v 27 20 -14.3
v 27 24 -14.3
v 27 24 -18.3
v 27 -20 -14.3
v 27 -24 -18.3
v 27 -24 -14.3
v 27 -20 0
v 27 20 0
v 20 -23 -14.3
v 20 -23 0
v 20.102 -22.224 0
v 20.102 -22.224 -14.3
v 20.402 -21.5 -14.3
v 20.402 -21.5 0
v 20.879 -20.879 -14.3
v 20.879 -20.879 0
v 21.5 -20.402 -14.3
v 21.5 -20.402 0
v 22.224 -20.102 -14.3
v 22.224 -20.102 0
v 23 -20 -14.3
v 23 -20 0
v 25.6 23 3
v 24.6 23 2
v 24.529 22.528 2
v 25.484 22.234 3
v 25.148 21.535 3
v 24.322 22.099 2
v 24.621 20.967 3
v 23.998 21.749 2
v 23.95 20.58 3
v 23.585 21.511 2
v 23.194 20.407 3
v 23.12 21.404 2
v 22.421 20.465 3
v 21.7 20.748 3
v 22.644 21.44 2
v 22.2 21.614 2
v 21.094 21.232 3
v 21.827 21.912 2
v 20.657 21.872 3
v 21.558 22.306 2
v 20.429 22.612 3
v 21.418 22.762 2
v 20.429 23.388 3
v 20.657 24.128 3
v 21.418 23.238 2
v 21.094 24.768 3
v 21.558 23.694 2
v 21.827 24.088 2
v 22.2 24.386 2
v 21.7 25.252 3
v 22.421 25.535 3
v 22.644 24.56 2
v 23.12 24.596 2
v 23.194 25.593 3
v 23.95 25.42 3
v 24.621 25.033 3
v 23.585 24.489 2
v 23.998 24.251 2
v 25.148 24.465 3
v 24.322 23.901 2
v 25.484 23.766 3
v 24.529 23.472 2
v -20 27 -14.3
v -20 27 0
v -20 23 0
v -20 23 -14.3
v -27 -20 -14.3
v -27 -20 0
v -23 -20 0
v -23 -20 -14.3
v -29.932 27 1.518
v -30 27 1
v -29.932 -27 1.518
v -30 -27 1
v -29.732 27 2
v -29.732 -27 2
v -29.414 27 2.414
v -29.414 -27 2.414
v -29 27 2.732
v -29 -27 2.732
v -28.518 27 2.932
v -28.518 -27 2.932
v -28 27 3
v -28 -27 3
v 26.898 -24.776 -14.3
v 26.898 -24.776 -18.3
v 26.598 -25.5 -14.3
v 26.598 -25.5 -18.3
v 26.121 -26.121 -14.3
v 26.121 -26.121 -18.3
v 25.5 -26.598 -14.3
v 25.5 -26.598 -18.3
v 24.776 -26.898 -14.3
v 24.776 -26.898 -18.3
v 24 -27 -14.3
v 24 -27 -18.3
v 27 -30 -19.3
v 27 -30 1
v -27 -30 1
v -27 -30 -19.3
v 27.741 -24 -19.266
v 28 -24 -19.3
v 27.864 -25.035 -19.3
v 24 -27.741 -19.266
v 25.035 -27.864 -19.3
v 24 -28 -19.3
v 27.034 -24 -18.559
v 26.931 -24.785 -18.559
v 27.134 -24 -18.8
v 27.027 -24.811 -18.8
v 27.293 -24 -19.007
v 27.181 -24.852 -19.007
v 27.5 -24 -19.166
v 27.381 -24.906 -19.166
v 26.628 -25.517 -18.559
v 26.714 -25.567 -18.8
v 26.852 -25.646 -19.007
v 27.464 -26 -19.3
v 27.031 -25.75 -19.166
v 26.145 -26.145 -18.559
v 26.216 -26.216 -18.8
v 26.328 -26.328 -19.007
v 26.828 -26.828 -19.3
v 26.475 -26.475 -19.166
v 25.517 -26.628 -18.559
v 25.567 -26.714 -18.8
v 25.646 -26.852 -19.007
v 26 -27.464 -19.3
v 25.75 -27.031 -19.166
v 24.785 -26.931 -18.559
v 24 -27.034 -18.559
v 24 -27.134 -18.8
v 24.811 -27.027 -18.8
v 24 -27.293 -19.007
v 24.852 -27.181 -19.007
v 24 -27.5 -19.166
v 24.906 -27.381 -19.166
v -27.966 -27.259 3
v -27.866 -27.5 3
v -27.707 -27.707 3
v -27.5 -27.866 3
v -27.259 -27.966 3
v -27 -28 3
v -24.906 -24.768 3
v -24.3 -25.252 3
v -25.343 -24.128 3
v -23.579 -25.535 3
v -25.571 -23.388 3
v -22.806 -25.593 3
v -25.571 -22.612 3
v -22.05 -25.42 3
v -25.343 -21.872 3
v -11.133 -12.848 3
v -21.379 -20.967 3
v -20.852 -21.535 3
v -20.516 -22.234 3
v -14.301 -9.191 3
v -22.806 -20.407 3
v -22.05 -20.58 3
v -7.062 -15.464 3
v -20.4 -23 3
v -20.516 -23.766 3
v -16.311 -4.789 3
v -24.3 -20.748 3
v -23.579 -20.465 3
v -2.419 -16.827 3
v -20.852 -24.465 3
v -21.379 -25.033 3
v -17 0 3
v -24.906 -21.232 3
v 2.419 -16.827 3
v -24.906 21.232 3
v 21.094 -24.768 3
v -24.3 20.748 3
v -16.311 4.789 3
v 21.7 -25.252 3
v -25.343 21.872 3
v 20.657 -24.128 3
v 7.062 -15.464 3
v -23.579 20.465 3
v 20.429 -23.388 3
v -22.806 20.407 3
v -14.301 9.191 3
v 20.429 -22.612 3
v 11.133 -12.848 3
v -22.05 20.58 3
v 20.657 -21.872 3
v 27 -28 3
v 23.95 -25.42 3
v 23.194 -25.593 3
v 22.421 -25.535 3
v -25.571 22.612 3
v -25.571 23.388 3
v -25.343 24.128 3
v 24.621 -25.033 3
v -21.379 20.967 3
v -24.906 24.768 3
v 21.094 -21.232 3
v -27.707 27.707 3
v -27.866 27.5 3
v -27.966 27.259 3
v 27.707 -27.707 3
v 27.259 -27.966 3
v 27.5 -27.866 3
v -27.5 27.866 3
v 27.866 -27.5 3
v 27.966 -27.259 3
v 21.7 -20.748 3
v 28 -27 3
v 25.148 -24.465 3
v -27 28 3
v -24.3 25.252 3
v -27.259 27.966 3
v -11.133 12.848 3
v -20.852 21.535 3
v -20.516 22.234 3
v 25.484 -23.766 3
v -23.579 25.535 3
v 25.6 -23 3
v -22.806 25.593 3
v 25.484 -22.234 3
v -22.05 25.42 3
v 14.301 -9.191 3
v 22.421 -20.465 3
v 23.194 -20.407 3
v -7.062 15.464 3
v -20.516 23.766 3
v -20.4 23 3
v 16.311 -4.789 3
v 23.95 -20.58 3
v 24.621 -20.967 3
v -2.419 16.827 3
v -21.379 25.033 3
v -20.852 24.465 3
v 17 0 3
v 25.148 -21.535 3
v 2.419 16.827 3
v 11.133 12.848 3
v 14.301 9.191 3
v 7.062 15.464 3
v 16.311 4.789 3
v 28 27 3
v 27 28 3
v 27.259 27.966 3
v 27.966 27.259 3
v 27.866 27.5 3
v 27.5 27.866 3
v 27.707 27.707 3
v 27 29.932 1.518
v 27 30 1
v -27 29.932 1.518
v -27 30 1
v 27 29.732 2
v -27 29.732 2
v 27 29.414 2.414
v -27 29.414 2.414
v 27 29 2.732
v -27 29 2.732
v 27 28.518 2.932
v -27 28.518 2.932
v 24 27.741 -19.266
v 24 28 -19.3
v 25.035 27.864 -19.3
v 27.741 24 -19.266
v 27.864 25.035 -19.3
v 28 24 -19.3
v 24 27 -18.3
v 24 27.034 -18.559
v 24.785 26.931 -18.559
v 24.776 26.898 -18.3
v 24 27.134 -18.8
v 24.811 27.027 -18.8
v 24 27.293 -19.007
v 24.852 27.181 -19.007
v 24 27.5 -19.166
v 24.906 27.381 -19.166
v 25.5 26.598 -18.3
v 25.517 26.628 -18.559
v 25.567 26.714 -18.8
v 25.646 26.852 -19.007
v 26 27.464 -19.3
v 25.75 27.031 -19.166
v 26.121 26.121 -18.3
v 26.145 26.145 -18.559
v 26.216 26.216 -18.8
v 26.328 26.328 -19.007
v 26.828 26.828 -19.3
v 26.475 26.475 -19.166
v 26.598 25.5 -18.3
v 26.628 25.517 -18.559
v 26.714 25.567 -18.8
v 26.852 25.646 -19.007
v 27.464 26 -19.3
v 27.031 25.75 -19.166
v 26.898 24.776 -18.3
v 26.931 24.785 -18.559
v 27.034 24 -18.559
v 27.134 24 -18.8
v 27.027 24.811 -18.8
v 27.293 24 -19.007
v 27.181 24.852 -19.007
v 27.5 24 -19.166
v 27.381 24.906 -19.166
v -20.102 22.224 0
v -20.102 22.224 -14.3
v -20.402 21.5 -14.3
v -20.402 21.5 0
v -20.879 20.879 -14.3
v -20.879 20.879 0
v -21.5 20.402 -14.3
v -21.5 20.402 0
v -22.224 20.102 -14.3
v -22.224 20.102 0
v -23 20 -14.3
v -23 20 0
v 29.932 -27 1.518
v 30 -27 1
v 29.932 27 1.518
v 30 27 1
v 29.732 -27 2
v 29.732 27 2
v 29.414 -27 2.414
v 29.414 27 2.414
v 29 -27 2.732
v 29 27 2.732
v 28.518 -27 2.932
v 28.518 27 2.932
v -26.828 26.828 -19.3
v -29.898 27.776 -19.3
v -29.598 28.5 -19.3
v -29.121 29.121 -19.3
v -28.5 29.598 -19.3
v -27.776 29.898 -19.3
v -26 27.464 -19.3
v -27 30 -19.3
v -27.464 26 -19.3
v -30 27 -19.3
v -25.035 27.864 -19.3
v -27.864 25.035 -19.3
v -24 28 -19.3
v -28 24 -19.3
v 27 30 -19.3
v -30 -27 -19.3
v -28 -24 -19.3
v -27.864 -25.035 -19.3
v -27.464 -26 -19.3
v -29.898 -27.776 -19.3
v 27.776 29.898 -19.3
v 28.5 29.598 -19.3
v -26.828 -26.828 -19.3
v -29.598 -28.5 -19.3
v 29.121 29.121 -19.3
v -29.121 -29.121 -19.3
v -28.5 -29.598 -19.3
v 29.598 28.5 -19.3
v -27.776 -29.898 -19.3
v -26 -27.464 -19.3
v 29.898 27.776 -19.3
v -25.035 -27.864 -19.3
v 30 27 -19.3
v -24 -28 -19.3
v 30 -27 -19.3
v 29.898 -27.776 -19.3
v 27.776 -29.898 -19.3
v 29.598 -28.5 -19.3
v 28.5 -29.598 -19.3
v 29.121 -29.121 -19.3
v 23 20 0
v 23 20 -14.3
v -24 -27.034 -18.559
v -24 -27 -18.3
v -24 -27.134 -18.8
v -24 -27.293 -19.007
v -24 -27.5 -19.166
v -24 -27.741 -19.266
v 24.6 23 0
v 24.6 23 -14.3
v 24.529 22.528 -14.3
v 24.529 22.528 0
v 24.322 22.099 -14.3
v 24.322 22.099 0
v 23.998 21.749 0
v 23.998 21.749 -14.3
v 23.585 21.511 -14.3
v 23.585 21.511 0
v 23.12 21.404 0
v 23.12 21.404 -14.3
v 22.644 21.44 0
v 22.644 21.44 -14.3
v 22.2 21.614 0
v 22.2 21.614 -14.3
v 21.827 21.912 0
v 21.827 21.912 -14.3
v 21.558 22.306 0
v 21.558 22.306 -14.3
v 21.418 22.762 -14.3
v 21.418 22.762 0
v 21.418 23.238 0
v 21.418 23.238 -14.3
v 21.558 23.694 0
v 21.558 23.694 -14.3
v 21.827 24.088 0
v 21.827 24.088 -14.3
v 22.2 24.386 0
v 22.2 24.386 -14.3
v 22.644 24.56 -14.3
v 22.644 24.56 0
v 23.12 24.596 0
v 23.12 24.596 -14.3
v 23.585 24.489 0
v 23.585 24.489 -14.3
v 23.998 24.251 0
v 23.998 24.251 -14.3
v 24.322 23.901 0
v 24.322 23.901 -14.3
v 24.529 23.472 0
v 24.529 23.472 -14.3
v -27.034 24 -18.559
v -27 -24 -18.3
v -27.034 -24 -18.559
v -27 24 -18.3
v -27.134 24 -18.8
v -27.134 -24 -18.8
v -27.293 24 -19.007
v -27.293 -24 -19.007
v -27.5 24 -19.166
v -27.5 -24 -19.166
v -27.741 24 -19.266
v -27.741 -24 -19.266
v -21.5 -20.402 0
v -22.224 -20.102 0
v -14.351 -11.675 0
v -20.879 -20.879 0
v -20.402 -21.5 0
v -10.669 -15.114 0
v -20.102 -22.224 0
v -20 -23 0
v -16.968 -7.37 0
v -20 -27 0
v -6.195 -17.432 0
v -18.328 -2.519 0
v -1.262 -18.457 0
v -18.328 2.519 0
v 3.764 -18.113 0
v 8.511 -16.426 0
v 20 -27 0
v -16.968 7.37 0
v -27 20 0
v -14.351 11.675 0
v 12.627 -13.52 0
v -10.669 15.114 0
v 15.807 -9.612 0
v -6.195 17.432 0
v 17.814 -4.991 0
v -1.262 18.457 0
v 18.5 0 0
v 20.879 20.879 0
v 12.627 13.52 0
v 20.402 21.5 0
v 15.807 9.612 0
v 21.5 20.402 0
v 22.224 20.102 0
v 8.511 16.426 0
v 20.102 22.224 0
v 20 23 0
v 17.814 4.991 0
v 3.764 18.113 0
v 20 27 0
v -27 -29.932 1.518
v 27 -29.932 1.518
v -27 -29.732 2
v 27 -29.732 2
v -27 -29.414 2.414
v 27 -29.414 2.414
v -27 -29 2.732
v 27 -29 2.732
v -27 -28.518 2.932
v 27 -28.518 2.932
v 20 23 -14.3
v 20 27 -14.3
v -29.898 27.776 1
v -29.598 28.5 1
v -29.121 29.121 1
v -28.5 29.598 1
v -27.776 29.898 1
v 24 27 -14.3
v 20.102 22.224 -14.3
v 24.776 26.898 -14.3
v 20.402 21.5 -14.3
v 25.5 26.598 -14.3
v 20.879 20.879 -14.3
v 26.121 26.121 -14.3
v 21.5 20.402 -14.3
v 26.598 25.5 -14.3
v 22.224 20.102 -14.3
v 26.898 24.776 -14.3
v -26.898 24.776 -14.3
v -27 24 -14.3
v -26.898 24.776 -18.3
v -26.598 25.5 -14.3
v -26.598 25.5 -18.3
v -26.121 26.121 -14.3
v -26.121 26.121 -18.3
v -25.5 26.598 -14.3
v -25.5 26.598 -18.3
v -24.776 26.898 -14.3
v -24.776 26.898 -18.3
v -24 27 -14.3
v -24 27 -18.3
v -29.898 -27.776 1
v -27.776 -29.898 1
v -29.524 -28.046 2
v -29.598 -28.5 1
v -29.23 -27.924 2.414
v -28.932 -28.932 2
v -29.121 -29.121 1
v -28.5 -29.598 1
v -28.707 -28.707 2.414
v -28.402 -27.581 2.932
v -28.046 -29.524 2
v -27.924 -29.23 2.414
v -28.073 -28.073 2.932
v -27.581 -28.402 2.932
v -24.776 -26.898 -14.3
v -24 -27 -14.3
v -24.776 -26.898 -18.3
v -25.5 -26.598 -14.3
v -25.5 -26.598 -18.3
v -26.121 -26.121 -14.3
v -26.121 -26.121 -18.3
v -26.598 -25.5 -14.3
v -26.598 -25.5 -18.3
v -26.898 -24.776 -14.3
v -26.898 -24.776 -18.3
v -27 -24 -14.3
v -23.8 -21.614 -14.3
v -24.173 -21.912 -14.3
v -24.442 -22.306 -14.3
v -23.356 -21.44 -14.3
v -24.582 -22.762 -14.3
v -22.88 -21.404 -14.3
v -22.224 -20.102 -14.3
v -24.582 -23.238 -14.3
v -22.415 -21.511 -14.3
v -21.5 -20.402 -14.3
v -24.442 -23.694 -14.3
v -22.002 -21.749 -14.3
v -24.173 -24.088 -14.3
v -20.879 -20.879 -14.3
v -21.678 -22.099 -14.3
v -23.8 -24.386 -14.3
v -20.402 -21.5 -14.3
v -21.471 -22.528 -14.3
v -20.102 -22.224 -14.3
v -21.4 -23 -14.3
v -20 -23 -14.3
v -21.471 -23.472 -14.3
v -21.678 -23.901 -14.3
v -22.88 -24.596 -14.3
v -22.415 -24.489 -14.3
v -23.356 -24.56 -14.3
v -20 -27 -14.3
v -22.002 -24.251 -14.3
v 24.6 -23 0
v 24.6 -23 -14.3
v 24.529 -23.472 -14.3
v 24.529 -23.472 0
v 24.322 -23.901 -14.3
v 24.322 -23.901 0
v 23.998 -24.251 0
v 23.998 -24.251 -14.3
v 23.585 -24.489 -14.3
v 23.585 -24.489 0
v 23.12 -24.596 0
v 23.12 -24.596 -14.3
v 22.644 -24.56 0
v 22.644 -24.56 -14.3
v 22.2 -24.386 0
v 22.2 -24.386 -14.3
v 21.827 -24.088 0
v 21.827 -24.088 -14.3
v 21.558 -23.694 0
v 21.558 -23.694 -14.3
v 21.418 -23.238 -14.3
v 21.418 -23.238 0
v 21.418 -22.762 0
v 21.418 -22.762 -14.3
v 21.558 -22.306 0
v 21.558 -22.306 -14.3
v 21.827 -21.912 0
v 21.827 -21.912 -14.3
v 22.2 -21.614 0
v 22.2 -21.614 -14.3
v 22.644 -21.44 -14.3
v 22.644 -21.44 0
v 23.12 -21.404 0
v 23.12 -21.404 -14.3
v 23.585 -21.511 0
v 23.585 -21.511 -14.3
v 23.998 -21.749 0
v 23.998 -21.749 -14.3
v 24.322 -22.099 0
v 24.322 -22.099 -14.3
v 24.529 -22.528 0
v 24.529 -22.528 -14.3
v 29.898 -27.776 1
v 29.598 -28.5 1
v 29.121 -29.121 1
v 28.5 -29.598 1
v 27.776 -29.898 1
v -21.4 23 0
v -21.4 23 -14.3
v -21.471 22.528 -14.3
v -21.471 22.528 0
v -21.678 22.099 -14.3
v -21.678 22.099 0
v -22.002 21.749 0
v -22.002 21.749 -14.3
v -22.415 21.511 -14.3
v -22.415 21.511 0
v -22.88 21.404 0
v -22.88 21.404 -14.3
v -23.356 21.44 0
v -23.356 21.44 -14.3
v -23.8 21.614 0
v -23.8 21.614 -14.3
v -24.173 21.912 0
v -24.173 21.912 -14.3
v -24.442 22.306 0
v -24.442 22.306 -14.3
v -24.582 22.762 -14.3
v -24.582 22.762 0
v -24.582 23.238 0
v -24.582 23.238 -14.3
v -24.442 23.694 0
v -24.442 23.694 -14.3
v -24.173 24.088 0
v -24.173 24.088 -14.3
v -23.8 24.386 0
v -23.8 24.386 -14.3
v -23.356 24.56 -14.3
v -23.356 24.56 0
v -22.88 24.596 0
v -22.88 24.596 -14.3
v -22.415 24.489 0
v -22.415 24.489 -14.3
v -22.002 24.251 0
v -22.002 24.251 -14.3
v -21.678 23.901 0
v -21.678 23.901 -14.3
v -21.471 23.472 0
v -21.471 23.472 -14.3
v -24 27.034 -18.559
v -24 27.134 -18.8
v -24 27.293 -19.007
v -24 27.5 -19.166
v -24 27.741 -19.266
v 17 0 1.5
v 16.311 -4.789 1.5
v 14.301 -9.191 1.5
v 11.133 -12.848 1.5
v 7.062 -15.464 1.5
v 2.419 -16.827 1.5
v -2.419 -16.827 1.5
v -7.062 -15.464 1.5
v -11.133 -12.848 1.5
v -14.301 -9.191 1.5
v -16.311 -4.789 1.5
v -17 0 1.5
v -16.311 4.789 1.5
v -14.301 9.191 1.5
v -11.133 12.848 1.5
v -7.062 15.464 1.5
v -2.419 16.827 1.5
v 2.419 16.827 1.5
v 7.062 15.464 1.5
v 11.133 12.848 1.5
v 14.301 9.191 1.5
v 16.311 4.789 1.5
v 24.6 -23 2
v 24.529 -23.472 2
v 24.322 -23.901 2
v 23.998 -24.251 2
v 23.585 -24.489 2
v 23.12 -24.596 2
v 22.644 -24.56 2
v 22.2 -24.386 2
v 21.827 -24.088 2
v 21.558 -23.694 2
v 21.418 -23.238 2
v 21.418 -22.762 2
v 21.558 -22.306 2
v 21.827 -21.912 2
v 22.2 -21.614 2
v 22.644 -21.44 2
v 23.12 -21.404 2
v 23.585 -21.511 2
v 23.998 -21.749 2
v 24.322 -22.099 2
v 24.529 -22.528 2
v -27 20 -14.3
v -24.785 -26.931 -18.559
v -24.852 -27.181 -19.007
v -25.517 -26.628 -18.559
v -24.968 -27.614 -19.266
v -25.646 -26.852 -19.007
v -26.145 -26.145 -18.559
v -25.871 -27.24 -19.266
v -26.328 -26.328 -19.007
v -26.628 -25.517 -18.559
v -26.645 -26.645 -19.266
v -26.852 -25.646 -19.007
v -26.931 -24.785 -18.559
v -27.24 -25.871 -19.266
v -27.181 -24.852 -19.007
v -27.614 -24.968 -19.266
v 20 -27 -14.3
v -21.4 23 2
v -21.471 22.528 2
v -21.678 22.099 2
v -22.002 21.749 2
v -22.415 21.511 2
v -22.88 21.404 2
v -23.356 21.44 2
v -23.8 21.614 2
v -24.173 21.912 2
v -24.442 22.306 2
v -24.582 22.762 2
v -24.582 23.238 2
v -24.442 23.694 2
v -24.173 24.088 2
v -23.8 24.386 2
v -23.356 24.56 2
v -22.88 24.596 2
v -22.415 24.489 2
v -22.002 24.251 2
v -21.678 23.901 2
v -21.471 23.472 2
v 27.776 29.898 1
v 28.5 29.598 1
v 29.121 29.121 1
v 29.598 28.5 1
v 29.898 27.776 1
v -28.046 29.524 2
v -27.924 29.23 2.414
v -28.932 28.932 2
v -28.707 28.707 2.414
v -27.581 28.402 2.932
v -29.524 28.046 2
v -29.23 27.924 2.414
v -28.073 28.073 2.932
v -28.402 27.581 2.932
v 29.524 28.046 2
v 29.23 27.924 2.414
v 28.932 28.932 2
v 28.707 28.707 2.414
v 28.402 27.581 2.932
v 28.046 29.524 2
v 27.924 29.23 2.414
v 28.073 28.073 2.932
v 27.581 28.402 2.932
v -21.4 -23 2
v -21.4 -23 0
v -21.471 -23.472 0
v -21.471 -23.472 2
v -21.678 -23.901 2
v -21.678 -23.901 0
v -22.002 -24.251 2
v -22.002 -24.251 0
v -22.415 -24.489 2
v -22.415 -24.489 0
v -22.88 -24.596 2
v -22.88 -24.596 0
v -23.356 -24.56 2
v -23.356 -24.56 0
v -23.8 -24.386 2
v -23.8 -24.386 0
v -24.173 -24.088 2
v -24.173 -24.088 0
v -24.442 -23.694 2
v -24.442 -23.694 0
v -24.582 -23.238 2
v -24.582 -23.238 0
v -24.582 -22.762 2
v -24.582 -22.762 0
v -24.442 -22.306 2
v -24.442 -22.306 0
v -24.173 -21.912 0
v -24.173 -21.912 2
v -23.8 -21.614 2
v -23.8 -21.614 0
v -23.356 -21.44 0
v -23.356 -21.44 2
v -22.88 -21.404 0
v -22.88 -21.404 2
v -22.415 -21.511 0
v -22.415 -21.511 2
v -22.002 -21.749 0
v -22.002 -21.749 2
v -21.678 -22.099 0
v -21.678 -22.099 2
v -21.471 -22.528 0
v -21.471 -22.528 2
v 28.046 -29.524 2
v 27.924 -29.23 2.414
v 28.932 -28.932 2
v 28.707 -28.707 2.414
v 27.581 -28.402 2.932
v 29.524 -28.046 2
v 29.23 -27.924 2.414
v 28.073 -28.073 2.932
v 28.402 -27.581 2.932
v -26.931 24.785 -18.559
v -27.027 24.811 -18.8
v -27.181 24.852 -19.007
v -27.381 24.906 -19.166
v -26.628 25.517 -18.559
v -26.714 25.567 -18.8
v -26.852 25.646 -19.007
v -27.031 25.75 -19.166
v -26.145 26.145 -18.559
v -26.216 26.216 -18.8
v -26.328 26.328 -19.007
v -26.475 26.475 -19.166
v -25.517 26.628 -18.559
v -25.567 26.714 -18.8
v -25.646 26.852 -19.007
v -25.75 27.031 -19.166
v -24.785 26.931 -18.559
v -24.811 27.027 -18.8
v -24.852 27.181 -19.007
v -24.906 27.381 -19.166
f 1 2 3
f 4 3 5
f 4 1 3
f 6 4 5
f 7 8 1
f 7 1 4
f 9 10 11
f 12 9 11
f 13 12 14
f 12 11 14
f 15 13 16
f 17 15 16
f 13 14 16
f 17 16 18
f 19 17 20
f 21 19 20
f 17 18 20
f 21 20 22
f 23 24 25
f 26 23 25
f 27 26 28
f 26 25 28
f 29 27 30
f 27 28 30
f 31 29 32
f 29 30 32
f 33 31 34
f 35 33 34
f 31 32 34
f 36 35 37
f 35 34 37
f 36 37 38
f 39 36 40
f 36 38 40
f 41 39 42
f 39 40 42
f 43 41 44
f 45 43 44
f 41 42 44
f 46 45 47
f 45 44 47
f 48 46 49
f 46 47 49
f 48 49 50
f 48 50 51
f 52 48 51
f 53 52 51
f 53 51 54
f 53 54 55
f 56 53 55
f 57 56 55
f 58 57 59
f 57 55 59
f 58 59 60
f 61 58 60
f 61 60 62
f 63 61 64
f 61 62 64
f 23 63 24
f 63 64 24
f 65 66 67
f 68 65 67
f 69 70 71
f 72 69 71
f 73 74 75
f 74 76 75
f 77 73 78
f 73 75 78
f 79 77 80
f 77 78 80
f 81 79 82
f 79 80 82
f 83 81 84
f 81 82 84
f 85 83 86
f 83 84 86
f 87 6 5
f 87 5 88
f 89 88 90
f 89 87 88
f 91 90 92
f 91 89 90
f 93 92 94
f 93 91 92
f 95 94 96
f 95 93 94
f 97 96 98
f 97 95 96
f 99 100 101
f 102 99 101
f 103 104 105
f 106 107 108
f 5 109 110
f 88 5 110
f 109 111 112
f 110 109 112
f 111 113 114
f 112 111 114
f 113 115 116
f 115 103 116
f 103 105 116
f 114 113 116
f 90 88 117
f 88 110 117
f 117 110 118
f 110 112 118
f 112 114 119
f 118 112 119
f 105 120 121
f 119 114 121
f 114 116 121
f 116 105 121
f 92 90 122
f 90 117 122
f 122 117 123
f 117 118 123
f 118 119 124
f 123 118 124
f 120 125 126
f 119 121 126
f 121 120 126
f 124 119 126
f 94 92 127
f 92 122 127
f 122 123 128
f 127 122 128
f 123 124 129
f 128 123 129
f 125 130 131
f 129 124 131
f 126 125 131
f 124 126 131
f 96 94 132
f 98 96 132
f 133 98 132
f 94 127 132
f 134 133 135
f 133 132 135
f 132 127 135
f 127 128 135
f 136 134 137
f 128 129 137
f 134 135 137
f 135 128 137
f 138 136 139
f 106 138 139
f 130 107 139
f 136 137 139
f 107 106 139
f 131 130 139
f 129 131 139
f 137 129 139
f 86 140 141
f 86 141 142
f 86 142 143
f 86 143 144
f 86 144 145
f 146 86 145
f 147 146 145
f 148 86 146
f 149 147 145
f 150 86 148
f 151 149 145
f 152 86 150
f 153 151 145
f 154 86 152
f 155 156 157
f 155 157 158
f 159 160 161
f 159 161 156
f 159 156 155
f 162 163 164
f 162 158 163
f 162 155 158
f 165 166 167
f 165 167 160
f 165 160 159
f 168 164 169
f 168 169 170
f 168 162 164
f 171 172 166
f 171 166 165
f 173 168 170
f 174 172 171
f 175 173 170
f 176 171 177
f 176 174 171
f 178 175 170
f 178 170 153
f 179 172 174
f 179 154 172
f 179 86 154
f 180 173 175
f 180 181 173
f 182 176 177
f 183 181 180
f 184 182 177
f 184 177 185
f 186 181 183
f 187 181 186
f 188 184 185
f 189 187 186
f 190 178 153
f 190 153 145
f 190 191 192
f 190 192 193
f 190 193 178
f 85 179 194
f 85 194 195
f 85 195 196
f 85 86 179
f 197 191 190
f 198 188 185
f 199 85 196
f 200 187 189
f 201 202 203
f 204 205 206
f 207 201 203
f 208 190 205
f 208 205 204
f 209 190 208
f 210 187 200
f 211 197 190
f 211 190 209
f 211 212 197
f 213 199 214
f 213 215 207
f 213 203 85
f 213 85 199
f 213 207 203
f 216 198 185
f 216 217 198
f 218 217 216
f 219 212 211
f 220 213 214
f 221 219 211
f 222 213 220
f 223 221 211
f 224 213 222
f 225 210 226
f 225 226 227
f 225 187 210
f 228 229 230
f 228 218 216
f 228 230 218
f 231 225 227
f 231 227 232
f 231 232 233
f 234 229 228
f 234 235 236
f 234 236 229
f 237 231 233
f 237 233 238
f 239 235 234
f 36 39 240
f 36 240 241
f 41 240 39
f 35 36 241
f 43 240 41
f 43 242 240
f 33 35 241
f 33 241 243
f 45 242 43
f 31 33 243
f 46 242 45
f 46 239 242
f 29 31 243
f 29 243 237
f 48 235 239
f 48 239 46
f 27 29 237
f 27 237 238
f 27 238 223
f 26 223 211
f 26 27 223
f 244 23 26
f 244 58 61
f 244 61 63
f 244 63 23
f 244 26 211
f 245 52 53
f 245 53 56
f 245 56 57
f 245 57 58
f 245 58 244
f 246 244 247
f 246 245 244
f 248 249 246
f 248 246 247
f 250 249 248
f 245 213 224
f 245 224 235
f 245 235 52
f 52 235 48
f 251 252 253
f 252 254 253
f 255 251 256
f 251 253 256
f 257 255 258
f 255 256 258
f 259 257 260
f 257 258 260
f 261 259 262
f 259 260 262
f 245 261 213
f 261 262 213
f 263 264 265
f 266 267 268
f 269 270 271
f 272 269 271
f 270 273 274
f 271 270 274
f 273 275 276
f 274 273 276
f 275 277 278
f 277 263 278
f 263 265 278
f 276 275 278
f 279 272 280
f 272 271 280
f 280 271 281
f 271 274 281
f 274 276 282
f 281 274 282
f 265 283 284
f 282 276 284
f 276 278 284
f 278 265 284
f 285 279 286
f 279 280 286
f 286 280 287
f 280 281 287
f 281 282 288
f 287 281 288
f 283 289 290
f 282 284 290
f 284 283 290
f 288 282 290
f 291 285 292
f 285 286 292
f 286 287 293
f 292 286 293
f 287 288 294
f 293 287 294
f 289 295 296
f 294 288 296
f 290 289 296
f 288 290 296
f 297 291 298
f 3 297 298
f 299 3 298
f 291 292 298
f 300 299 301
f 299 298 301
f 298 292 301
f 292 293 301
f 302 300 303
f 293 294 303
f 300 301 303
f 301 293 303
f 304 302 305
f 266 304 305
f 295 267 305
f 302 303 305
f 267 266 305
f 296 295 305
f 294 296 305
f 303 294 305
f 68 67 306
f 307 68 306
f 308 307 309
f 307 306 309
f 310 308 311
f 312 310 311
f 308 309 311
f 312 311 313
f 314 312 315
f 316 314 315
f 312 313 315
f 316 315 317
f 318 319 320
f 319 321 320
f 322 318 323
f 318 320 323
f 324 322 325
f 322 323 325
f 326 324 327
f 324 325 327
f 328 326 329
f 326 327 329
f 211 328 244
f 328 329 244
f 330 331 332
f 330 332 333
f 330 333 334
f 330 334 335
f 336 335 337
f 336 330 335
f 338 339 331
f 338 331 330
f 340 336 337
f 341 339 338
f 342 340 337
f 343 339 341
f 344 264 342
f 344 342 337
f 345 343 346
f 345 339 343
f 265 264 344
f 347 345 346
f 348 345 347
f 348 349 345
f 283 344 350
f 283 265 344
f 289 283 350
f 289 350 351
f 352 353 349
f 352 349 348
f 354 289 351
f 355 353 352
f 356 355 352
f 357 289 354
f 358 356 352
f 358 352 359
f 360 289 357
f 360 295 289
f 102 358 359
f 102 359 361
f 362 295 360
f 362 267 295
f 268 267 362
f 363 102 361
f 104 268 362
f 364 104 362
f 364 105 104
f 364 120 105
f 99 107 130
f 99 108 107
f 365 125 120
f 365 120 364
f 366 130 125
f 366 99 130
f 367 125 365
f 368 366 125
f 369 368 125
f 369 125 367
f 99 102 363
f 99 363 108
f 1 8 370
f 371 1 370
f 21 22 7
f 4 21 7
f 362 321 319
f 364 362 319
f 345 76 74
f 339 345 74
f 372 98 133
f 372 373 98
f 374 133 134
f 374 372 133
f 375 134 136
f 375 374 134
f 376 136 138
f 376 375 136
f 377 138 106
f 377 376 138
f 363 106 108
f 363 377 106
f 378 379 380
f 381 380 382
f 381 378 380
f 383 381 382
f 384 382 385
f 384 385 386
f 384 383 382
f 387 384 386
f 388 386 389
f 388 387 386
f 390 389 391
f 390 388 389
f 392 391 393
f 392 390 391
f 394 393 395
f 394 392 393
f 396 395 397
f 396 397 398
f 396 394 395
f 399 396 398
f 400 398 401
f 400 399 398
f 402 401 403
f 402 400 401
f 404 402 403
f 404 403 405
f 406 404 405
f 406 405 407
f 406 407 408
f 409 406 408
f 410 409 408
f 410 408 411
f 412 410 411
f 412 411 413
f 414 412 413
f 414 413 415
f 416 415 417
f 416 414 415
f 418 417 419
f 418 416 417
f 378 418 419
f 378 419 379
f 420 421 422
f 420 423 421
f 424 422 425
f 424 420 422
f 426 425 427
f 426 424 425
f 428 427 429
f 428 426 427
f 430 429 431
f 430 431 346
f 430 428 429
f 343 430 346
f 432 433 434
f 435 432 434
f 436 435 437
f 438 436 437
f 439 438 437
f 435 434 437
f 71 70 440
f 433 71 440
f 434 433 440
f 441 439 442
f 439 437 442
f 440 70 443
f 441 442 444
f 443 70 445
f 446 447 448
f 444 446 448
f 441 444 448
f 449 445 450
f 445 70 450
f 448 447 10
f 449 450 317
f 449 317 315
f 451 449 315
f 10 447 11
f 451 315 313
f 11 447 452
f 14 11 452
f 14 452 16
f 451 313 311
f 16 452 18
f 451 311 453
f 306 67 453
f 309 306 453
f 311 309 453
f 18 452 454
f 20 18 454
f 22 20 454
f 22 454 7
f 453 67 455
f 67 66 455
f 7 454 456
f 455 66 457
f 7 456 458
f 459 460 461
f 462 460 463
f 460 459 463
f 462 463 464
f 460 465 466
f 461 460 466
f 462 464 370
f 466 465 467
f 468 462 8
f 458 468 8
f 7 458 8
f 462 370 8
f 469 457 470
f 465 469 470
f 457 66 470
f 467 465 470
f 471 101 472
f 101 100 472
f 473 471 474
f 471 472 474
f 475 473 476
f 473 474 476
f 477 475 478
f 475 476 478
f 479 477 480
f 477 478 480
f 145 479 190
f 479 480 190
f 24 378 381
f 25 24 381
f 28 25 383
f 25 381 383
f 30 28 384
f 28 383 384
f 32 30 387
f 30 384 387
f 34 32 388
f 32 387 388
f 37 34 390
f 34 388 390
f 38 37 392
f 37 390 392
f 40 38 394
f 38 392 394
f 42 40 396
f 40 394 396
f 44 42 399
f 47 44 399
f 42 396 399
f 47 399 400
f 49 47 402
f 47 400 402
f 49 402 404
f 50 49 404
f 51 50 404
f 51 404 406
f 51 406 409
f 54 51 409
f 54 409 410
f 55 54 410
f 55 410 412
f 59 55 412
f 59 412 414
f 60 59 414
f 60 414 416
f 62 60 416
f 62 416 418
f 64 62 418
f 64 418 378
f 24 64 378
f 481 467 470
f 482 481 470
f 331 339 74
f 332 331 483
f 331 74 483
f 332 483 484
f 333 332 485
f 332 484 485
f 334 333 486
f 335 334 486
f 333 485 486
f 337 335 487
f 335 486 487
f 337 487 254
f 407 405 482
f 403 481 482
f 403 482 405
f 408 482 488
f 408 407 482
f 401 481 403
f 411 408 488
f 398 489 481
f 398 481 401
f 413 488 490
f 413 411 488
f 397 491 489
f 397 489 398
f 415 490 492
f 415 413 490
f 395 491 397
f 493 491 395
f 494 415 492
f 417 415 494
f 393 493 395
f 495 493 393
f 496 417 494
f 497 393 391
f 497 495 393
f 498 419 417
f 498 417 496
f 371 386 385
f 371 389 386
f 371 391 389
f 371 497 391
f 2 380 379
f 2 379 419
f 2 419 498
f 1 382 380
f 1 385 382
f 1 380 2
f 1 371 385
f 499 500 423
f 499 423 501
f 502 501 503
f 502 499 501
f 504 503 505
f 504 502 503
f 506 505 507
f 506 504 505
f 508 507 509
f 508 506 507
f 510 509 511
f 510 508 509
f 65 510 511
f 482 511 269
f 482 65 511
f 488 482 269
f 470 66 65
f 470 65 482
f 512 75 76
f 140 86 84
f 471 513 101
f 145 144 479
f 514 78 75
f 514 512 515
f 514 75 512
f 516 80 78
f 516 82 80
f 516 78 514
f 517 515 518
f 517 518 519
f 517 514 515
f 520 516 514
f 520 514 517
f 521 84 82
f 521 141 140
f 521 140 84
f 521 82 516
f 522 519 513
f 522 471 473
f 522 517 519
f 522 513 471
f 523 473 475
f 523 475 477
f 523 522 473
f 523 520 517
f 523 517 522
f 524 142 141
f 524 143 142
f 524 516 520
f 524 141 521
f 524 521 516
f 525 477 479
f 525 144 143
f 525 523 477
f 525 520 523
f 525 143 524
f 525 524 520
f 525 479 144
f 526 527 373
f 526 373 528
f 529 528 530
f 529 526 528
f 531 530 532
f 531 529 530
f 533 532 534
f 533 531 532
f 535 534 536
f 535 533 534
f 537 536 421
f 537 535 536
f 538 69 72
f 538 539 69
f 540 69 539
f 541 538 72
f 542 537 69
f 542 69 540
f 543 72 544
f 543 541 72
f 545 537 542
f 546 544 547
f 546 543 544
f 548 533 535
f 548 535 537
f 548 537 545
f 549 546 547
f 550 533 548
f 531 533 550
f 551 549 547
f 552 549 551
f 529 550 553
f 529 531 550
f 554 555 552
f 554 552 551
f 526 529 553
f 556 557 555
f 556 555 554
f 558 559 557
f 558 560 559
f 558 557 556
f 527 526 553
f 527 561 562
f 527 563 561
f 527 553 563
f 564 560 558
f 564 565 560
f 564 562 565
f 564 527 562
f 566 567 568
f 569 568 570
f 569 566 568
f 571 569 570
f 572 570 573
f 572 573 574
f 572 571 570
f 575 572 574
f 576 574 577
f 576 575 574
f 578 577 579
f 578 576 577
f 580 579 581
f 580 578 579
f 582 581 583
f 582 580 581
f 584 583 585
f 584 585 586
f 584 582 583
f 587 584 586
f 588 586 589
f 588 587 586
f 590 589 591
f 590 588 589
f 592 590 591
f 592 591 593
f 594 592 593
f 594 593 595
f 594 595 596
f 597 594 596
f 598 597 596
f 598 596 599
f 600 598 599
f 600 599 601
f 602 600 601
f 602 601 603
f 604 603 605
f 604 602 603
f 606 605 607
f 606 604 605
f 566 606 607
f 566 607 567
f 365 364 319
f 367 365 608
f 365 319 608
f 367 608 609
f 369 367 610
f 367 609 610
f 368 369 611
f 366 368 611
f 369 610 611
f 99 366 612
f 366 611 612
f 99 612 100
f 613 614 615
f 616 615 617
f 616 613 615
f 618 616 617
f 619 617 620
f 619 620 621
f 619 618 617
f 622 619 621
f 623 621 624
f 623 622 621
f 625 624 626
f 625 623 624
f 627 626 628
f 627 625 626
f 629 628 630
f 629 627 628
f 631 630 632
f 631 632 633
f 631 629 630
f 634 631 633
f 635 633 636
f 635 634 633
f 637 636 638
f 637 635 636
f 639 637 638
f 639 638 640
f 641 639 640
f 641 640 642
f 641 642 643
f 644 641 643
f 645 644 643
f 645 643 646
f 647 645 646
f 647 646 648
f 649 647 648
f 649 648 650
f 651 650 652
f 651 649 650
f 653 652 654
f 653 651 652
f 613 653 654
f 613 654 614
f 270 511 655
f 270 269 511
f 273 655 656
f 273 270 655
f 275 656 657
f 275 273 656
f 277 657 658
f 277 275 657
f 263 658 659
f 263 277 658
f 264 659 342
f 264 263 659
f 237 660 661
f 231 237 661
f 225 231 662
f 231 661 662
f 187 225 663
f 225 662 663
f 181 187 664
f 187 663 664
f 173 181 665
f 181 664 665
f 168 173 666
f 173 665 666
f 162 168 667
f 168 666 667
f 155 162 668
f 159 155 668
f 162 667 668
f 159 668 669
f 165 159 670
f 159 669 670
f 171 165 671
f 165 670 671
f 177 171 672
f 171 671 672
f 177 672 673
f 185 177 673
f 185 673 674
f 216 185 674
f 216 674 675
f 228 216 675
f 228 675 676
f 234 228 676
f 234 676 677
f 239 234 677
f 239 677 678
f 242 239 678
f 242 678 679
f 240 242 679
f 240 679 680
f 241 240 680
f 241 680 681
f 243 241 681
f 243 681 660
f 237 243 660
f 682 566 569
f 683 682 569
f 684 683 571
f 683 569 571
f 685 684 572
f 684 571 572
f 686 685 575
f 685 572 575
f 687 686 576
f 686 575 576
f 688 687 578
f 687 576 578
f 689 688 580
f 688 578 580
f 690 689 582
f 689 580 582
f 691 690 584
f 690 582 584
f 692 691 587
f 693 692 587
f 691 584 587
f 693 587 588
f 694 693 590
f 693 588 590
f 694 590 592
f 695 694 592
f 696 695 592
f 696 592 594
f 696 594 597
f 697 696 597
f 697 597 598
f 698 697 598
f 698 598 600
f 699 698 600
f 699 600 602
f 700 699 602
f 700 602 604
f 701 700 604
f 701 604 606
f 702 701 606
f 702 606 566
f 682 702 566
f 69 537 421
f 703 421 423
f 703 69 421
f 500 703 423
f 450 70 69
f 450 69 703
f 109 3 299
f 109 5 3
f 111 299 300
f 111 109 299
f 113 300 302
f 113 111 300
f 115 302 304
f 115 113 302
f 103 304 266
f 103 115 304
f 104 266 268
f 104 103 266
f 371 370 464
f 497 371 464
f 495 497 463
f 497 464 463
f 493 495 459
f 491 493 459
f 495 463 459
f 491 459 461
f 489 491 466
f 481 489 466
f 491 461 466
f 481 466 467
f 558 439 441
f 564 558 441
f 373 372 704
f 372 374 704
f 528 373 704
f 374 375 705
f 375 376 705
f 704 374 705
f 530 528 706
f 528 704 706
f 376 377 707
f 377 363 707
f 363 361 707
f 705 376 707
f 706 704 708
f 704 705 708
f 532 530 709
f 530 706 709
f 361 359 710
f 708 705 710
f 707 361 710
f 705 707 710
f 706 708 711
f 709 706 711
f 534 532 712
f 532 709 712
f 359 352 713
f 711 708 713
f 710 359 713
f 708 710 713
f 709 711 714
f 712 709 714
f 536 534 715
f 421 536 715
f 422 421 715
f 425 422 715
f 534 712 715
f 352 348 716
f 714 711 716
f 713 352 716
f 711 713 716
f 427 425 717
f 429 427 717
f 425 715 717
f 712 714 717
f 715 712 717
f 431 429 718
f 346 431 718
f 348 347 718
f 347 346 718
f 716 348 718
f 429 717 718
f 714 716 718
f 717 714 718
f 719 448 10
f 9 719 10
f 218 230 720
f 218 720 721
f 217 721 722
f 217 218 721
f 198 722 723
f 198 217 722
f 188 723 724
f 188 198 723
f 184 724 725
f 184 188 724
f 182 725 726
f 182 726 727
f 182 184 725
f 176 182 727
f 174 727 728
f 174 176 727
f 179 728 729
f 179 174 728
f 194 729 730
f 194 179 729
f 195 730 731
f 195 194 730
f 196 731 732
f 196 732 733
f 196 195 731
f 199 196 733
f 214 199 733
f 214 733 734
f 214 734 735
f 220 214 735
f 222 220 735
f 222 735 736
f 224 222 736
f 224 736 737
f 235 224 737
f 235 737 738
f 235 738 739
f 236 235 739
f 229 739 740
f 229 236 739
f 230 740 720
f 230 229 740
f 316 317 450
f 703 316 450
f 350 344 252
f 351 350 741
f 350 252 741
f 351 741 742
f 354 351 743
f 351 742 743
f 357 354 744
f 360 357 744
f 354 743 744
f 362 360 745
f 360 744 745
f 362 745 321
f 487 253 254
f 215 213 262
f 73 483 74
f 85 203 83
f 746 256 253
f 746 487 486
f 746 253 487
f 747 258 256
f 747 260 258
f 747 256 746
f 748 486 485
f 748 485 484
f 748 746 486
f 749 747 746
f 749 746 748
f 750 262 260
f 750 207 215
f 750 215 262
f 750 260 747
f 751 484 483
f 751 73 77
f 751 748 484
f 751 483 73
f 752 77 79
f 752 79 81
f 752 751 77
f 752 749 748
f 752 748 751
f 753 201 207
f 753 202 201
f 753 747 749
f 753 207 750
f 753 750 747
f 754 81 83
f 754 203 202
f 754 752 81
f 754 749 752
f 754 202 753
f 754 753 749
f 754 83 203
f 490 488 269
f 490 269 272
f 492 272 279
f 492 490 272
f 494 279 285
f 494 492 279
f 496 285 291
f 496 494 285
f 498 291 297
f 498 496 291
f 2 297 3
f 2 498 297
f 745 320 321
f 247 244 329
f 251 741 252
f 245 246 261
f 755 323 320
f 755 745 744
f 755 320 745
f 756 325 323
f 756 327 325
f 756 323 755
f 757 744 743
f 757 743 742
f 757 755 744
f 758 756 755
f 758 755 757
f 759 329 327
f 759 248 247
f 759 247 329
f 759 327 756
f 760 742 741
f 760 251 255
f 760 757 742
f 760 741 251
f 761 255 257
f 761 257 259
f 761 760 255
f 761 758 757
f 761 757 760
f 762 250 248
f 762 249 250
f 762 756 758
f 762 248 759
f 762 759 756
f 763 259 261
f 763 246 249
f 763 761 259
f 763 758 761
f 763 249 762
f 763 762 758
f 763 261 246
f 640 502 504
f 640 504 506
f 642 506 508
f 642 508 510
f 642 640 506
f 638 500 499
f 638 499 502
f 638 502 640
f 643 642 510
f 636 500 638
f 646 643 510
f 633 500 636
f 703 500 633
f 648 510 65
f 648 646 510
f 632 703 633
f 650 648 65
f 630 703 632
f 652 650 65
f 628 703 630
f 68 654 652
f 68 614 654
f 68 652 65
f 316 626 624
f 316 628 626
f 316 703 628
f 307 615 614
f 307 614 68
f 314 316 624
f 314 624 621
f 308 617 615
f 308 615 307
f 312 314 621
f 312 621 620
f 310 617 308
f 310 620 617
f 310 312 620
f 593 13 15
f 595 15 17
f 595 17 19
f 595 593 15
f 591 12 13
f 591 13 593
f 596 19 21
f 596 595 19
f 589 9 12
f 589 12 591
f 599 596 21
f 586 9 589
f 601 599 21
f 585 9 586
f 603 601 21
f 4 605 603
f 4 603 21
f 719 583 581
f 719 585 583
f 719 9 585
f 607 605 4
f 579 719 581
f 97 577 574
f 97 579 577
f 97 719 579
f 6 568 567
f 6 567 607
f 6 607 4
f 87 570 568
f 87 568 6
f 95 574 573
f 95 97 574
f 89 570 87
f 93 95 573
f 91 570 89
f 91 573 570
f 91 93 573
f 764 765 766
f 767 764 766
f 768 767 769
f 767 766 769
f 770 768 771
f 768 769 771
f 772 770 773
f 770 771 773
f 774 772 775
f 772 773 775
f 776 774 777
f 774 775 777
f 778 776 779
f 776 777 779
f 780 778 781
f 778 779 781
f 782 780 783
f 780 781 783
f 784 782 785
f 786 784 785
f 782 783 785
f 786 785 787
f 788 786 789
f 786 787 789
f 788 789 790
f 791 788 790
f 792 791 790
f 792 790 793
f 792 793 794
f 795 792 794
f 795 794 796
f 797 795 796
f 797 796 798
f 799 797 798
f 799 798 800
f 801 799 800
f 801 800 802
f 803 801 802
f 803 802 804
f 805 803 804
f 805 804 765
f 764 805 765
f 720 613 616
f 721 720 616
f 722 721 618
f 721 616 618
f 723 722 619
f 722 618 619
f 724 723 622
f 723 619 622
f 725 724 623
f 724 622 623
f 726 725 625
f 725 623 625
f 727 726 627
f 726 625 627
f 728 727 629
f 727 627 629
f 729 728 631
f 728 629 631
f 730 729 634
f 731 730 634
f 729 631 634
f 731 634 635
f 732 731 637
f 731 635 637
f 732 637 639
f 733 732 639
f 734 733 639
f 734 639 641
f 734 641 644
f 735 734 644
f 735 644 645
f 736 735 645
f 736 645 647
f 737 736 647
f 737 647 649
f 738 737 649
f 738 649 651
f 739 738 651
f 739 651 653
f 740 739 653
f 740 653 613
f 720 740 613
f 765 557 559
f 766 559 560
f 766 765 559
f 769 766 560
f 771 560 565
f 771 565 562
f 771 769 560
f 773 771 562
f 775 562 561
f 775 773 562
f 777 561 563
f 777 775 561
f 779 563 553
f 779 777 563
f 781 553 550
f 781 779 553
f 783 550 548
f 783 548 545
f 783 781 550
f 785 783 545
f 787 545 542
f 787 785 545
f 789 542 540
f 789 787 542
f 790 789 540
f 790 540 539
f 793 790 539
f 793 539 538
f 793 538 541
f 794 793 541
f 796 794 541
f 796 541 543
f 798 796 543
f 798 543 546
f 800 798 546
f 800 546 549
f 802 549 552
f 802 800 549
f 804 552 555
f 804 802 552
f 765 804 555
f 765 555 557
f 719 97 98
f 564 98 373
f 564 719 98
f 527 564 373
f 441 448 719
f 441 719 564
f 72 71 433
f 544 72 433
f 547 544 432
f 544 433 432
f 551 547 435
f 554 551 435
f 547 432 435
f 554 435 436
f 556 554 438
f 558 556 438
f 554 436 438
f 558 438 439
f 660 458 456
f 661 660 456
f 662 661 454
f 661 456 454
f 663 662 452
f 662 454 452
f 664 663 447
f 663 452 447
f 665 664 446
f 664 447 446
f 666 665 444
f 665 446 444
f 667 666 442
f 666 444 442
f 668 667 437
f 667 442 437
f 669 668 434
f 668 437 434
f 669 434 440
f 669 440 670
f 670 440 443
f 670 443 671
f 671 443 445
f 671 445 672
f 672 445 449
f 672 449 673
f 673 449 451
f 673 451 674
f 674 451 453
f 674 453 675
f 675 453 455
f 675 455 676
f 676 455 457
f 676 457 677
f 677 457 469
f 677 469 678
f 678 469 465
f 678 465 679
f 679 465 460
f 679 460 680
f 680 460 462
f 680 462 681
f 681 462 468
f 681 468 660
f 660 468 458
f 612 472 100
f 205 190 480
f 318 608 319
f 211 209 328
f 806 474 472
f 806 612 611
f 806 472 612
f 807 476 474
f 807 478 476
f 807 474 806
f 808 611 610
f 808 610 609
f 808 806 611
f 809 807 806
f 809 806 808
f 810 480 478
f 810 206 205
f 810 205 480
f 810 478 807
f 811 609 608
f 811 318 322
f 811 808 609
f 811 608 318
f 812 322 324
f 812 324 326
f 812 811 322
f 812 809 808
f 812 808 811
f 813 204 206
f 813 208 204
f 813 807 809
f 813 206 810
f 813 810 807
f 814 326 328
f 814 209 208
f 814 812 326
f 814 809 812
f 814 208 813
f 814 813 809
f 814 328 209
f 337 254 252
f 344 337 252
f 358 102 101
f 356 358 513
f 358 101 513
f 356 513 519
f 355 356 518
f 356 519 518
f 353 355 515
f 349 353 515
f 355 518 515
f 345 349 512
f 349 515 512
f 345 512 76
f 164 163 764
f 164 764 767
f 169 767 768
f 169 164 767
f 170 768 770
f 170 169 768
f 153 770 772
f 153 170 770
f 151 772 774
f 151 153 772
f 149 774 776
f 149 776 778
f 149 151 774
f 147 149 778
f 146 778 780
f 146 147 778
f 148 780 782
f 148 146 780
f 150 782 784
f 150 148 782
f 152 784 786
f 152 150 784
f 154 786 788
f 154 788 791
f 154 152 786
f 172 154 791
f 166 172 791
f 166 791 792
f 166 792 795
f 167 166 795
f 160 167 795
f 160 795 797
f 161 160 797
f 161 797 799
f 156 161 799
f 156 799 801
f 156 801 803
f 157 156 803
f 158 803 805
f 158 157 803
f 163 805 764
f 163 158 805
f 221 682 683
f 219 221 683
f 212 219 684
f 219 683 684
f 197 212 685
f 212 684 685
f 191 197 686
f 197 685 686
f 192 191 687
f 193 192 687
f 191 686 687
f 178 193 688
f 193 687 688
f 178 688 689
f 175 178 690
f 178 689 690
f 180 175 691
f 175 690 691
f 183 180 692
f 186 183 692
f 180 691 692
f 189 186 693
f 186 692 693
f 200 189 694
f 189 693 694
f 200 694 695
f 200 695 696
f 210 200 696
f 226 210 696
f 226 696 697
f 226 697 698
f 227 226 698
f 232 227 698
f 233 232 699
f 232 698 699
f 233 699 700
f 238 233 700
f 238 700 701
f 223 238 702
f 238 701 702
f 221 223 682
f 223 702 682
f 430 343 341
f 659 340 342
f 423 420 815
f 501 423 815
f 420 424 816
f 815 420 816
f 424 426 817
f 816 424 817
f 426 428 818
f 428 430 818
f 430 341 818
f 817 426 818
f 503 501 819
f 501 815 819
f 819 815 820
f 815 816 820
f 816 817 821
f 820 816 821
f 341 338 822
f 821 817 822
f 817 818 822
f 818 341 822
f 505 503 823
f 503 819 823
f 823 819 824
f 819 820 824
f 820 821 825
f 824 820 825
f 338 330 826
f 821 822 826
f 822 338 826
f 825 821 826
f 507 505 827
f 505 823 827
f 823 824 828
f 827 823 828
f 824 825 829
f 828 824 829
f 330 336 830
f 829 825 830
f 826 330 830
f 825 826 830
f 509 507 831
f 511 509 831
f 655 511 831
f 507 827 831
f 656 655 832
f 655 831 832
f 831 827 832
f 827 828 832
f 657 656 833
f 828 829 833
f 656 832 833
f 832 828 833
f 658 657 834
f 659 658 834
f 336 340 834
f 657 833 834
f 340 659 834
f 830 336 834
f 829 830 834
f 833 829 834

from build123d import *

# Parameters (mm, degrees)
PAD_DEPTH       = 3
SKETCH001_R     = 17
POCKET_DEPTH    = 3.001
PAD001_DEPTH    = 19.3
FILLET_R        = 1
FILLET001_R     = 2
CHAMFER_SIZE    = 1.5
SKETCH003_R     = 1.6
POCKET001_DEPTH = 5
SKETCH004_R     = 1.6
PAD002_DEPTH    = 14.3
CHAMFER001_SIZE = 1


with BuildPart() as part:
    # Sketch → Pad (new body)
    with BuildSketch(Plane.XY):
        with BuildLine():
            Line((-30, 27), (-30, -27))
            ThreePointArc((-30, -27), (-29.12132, -29.12132), (-27, -30))
            Line((-27, -30), (27, -30))
            ThreePointArc((27, -30), (29.12132, -29.12132), (30, -27))
            Line((30, -27), (30, 27))
            ThreePointArc((30, 27), (29.12132, 29.12132), (27, 30))
            Line((27, 30), (-27, 30))
            ThreePointArc((-27, 30), (-29.12132, 29.12132), (-30, 27))
        make_face()
    extrude(amount=PAD_DEPTH)

    # Sketch001 (on Face9 of Pad) → Pocket (cut, through all)
    with BuildSketch(Plane(origin=(0, 0, 0), x_dir=(1, 0, 0), z_dir=(0, 0, -1))):
        Circle(SKETCH001_R)
    extrude(amount=-POCKET_DEPTH, mode=Mode.SUBTRACT)

    # Sketch002 (on Face4 of Pocket) → Pad001 (join)
    with BuildSketch(Plane(origin=(0, 0, 0), x_dir=(1, 0, 0), z_dir=(0, 0, -1))):
        with BuildLine():
            Line((-30, 27), (-30, -27))
            ThreePointArc((-30, -27), (-29.12132, -29.12132), (-27, -30))
            Line((-27, -30), (27, -30))
            ThreePointArc((27, -30), (29.12132, -29.12132), (30, -27))
            Line((30, -27), (30, 27))
            ThreePointArc((30, 27), (29.12132, 29.12132), (27, 30))
            Line((27, 30), (-27, 30))
            ThreePointArc((-27, 30), (-29.12132, 29.12132), (-30, 27))
        make_face()
        with BuildLine():
            Line((-27, 24), (-27, -24))
            ThreePointArc((-27, -24), (-26.12132, -26.12132), (-24, -27))
            Line((-24, -27), (24, -27))
            ThreePointArc((24, -27), (26.12132, -26.12132), (27, -24))
            Line((27, -24), (27, 24))
            ThreePointArc((27, 24), (26.12132, 26.12132), (24, 27))
            Line((24, 27), (-24, 27))
            ThreePointArc((-24, 27), (-26.12132, 26.12132), (-27, 24))
        make_face(mode=Mode.SUBTRACT)
    extrude(amount=PAD001_DEPTH)

    # Fillet
    fillet_edges = [part.edges().sort_by_distance(p)[0] for p in [
        (-27, 0, -19.3),
        (27, 0, -19.3),
        (0, -27, -19.3),
        (0, 27, -19.3),
    ]]
    fillet(fillet_edges, radius=FILLET_R)

    # Fillet001
    fillet001_edges = [part.edges().sort_by_distance(p)[0] for p in [
        (0, 30, 3),
        (-30, 0, 3),
        (0, -30, 3),
        (30, 0, 3),
    ]]
    fillet(fillet001_edges, radius=FILLET001_R)

    # Chamfer
    chamfer_edges = [part.edges().sort_by_distance(p)[0] for p in [
        (-17, 0, 0),
    ]]
    chamfer(chamfer_edges, length=CHAMFER_SIZE)

    # Sketch003 (on Face4 of Chamfer) → Pocket001 (cut)
    with BuildSketch(Plane(origin=(0, 0, 0), x_dir=(1, 0, 0), z_dir=(0, 0, -1))):
        with Locations((-23, 23)):
            Circle(SKETCH003_R)
        with Locations((-23, -23)):
            Circle(SKETCH003_R)
        with Locations((23, -23)):
            Circle(SKETCH003_R)
        with Locations((23, 23)):
            Circle(SKETCH003_R)
    extrude(amount=-POCKET001_DEPTH, mode=Mode.SUBTRACT)

    # Sketch004 (on Face4 of Pocket001) → Pad002 (join)
    with BuildSketch(Plane(origin=(0, 0, 0), x_dir=(1, 0, 0), z_dir=(0, 0, -1))):
        with BuildLine():
            Line((-27, 24), (-27, 20))
            Line((-27, 20), (-23, 20))
            ThreePointArc((-23, 20), (-20.87868, 20.87868), (-20, 23))
            Line((-20, 23), (-20, 27))
            Line((-20, 27), (-24, 27))
            ThreePointArc((-24, 27), (-26.12132, 26.12132), (-27, 24))
        make_face()
        with Locations((-23, 23)):
            Circle(SKETCH004_R, mode=Mode.SUBTRACT)
        with BuildLine():
            Line((23, 20), (27, 20))
            Line((27, 20), (27, 24))
            ThreePointArc((27, 24), (26.12132, 26.12132), (24, 27))
            Line((24, 27), (20, 27))
            Line((20, 27), (20, 23))
            ThreePointArc((20, 23), (20.87868, 20.87868), (23, 20))
        make_face()
        with Locations((23, 23)):
            Circle(SKETCH004_R, mode=Mode.SUBTRACT)
        with BuildLine():
            Line((-23, -20), (-27, -20))
            Line((-27, -20), (-27, -24))
            ThreePointArc((-27, -24), (-26.12132, -26.12132), (-24, -27))
            Line((-24, -27), (-20, -27))
            Line((-20, -27), (-20, -23))
            ThreePointArc((-20, -23), (-20.87868, -20.87868), (-23, -20))
        make_face()
        with Locations((-23, -23)):
            Circle(SKETCH004_R, mode=Mode.SUBTRACT)
        with BuildLine():
            Line((27, -20), (23, -20))
            ThreePointArc((23, -20), (20.87868, -20.87868), (20, -23))
            Line((20, -23), (20, -27))
            Line((20, -27), (24, -27))
            ThreePointArc((24, -27), (26.12132, -26.12132), (27, -24))
            Line((27, -24), (27, -20))
        make_face()
        with Locations((23, -23)):
            Circle(SKETCH004_R, mode=Mode.SUBTRACT)
    extrude(amount=PAD002_DEPTH)

    # Chamfer001
    chamfer001_edges = [part.edges().sort_by_distance(p)[0] for p in [
        (-24.6, -23, 3),
        (21.4, -23, 3),
        (-24.6, 23, 3),
        (21.4, 23, 3),
    ]]
    chamfer(chamfer001_edges, length=CHAMFER001_SIZE)


solid = part.part
